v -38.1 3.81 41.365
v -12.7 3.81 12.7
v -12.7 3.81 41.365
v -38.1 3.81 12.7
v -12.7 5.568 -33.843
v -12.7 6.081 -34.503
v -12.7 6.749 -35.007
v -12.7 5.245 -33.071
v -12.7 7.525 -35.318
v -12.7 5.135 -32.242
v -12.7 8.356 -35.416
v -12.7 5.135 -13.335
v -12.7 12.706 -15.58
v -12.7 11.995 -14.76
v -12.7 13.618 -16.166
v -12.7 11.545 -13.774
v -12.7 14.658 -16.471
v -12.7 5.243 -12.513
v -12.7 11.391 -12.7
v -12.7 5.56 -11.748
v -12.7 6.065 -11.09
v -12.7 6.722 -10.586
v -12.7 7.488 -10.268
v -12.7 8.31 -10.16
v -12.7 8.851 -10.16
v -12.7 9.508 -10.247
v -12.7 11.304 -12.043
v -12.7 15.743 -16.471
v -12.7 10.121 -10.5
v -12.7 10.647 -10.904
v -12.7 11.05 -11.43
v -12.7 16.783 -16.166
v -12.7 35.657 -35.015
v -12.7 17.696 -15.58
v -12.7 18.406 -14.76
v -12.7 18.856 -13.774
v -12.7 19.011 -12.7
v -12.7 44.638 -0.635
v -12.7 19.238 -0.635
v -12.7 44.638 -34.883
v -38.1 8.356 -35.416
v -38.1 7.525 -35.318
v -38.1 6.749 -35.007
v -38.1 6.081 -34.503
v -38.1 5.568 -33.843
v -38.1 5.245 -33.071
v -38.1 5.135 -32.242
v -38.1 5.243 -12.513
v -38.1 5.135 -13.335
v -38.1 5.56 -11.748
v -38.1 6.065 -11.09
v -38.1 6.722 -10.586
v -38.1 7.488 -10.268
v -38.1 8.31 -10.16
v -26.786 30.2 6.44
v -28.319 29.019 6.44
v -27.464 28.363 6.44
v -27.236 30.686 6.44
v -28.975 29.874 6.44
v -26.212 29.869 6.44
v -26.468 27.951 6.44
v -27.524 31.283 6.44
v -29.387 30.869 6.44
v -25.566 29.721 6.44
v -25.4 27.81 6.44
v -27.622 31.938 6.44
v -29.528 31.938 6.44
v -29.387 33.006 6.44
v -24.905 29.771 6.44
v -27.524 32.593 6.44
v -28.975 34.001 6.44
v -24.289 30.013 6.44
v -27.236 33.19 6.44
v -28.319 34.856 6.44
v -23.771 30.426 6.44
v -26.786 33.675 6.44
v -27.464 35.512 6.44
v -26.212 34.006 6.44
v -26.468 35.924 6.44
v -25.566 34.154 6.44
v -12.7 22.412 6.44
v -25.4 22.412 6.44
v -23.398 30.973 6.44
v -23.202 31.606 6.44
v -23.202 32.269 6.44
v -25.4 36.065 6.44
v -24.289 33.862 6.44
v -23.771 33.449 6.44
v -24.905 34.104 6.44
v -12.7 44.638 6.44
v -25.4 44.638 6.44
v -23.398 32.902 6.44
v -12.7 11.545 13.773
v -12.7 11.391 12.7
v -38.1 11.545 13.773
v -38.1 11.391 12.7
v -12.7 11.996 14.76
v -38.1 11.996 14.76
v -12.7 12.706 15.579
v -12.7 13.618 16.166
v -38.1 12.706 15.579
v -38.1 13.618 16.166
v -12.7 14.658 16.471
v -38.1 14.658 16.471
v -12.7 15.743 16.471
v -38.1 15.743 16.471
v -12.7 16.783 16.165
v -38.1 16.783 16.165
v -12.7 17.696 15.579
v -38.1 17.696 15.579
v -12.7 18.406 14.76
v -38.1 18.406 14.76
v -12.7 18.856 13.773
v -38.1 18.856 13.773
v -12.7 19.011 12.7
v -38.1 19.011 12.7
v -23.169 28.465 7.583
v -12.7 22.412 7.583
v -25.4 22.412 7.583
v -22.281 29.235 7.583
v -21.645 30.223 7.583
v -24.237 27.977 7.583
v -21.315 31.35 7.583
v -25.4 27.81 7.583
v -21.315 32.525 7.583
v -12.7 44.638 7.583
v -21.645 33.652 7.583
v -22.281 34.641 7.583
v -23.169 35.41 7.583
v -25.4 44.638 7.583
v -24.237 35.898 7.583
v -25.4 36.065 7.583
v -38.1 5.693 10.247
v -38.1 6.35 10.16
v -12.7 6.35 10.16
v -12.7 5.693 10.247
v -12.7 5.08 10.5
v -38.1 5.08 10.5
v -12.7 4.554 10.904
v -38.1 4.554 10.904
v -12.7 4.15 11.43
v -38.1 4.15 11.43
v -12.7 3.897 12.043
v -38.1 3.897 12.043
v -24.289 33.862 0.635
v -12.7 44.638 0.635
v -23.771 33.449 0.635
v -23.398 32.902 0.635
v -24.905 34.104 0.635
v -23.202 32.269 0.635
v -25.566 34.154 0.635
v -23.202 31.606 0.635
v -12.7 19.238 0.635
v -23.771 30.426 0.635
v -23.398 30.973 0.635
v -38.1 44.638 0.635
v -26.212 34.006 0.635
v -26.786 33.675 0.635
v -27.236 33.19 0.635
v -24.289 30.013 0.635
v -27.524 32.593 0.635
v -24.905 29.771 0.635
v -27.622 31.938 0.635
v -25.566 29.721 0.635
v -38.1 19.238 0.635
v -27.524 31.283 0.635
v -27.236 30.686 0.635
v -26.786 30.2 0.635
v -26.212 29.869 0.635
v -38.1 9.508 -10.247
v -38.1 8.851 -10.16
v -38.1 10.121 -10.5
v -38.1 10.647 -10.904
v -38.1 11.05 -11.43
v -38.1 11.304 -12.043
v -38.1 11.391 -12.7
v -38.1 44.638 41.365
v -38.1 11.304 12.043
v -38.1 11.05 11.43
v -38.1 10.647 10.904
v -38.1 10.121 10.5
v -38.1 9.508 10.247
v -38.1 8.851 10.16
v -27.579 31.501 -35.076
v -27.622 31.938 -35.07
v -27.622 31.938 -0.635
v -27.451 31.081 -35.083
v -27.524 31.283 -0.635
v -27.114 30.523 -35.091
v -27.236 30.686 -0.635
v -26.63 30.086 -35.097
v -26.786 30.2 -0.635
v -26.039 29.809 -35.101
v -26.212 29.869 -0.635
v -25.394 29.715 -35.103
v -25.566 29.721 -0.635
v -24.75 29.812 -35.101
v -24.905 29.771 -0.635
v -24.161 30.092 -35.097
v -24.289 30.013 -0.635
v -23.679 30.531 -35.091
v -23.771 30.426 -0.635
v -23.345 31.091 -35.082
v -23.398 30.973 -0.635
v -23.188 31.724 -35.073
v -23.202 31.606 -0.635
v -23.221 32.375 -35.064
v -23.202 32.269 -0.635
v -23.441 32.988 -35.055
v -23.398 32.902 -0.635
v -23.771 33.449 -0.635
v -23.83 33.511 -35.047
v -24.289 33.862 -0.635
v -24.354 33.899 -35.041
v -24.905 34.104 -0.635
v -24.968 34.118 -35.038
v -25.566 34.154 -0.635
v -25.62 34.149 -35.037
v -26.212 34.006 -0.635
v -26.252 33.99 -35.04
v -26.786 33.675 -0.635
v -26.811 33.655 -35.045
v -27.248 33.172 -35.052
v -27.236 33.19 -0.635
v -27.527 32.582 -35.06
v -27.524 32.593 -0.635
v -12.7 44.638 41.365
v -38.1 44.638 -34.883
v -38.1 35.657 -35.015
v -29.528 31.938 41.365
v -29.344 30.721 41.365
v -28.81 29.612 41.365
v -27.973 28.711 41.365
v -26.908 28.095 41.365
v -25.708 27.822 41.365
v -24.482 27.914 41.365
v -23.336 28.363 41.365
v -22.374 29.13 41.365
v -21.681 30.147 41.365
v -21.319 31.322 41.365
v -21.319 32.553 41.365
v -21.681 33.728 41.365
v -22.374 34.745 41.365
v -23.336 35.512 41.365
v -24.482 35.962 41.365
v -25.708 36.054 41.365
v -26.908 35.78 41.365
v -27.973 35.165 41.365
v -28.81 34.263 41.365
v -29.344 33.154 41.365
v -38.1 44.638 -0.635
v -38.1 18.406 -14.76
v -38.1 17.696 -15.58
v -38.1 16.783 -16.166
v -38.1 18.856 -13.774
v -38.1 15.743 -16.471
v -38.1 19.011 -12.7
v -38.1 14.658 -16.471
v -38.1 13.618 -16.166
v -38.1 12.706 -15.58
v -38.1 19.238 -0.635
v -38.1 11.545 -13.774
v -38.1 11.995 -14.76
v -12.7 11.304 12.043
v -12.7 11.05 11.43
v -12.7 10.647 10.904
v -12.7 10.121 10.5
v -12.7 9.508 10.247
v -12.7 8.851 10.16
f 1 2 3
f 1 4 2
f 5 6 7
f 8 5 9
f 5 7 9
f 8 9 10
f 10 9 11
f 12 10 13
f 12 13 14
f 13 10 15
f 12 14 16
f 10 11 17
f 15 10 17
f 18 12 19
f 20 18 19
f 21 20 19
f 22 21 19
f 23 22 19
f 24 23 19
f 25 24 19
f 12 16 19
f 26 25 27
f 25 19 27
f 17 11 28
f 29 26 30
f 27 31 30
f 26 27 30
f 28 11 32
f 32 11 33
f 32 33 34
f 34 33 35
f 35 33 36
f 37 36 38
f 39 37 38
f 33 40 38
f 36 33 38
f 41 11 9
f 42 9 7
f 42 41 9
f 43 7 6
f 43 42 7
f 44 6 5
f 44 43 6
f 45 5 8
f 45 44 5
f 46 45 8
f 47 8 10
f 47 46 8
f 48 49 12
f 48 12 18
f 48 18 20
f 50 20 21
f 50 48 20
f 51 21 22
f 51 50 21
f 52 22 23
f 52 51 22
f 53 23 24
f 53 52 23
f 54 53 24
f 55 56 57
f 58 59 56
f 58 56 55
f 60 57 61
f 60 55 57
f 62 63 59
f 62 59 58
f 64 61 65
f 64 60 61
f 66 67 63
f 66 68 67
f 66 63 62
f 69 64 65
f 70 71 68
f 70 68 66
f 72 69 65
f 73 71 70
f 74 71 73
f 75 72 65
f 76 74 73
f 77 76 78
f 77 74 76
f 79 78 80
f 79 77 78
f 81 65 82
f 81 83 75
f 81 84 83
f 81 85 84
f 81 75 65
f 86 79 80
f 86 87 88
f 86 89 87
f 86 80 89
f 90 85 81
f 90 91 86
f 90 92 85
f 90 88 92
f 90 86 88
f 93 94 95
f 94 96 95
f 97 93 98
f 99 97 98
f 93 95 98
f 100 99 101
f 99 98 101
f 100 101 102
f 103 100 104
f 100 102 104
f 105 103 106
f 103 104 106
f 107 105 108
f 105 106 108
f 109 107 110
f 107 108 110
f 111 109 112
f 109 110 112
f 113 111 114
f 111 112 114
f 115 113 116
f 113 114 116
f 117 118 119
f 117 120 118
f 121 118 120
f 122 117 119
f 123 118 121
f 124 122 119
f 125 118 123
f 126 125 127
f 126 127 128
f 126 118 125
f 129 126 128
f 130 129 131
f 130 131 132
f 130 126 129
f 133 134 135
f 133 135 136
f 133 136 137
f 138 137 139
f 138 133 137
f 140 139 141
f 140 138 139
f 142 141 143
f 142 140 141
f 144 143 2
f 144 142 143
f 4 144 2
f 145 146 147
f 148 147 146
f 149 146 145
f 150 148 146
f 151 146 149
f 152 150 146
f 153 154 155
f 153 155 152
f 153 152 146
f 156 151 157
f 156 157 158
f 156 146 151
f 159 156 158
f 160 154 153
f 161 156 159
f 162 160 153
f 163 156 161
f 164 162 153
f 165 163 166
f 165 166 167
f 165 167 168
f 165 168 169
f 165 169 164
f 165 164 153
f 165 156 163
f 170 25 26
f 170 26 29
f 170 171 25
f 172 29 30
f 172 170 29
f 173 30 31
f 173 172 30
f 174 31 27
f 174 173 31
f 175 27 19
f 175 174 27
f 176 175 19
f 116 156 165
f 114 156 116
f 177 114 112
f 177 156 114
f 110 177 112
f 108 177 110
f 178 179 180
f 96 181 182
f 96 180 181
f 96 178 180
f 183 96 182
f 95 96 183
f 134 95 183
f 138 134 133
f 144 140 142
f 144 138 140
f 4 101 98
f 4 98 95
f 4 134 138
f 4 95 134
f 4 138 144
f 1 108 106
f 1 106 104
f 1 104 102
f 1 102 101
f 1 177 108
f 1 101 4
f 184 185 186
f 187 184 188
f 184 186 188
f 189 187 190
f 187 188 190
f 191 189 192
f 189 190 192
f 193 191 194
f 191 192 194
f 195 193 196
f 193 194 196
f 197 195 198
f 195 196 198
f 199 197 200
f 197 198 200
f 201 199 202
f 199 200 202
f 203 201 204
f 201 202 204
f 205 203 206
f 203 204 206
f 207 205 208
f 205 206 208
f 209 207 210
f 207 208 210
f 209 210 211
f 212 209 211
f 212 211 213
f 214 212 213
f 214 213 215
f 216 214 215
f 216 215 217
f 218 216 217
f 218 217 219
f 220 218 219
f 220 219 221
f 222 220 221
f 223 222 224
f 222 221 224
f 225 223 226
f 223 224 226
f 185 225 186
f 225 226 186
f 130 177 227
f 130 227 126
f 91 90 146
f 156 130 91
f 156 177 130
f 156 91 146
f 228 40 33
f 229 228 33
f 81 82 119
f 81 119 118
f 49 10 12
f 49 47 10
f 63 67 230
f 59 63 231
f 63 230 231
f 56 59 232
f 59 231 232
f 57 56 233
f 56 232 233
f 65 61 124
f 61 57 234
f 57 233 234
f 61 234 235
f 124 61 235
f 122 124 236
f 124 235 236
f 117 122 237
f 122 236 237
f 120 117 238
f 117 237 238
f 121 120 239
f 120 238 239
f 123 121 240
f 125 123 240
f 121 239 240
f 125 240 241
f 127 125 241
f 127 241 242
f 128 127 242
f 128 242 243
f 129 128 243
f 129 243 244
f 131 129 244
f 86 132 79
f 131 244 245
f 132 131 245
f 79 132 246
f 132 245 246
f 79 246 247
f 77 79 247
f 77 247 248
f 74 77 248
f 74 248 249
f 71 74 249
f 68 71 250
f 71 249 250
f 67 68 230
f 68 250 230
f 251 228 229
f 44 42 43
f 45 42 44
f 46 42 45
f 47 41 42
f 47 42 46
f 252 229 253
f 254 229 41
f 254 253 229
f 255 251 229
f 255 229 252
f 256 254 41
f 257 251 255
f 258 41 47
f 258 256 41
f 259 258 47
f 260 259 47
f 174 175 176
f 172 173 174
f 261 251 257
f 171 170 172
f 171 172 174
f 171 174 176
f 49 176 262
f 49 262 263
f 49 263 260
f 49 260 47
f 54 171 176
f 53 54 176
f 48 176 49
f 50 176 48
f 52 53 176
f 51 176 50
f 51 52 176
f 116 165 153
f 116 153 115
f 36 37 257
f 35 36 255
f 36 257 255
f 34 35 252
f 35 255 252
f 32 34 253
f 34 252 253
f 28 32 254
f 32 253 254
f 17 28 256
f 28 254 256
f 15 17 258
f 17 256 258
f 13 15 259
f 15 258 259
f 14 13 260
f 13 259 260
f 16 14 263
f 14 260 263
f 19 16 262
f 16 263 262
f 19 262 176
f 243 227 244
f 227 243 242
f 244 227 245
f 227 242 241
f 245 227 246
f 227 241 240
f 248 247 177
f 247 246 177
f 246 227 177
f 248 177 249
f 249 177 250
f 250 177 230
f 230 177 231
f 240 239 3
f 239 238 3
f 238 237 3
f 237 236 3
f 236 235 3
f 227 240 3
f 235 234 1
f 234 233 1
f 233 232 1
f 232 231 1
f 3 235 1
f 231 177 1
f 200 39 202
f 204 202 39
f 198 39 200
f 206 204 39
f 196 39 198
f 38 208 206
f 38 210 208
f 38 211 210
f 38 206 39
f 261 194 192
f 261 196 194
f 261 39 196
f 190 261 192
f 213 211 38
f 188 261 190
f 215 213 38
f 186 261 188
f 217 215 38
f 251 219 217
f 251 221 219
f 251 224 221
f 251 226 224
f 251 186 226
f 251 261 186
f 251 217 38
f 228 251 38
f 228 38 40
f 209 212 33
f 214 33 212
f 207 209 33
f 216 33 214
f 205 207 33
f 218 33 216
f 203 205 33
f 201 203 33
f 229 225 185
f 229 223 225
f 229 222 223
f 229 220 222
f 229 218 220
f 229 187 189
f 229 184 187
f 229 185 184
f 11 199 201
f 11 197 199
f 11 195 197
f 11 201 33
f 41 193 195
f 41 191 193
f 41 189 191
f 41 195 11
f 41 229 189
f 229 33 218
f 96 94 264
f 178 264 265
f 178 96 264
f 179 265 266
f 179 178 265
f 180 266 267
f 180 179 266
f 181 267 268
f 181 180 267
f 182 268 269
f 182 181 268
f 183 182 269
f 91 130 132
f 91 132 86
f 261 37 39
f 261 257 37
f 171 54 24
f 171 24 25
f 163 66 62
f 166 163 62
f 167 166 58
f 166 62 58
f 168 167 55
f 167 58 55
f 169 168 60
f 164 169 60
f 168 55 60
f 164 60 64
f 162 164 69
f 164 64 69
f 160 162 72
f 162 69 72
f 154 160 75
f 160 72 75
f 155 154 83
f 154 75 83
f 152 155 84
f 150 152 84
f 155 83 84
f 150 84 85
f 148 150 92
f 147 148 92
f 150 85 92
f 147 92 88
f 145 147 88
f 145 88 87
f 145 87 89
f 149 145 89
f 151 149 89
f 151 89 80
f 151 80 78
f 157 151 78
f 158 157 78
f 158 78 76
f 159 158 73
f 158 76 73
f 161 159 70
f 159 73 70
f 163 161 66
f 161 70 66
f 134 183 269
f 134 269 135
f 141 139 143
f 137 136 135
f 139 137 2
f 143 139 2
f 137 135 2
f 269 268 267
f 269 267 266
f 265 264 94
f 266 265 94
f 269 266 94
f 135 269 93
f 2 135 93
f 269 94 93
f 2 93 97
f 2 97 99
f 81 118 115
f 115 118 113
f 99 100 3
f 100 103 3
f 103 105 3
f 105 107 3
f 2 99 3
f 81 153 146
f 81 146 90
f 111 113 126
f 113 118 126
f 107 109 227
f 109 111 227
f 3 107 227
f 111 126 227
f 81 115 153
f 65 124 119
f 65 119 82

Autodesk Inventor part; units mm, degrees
sketch "Sketch1" plane through (0, 0, 0) normal (1, 0, 0) x (0, 1, 0)
  line L0 (-3.175, -15.8752) -> (-3.175, 15.8752)
  arc A0 (18.3756, 12.6998) -> (12.0256, 12.7) centre (15.2006, 12.6998) ccw
  arc A1 (12.0256, -12.7002) -> (18.3756, -12.7002) centre (15.2006, -12.7002) ccw
  line L1 (8.8506, 9.5252) -> (6.35, 9.5252)
  line L2 (8.8506, -9.5252) -> (5.1346, -9.5252)
  line L3 (15.2006, 12.6998) -> (15.2006, -12.7002) construction
  line L4 (3.175, 14.6052) -> (3.175, 12.7002)
  arc A2 (8.8506, 9.5252) -> (12.0256, 12.7) centre (8.8506, 12.7002) ccw
  arc A3 (12.0256, -12.7002) -> (8.8506, -9.5252) centre (8.8506, -12.7002) ccw
  arc A4 (3.175, 12.7002) -> (6.35, 9.5252) centre (6.35, 12.7002) ccw
  arc A5 (5.1346, -9.5252) -> (1.9937, -12.2364) centre (5.1346, -12.7002) ccw
  line L5 (-3.175, -15.8752) -> (-3.175, -22.2252)
  line L6 (1.905, 15.8752) -> (-3.175, 15.8752)
  arc A6 (3.175, 14.6052) -> (1.905, 15.8752) centre (1.905, 14.6052) ccw
  line L7 (18.3756, 12.6998) -> (18.3756, -12.7002)
  line L8 (1.6475, -13.2791) -> (-3.175, -22.2252)
  arc A7 (1.6475, -13.2791) -> (1.9937, -12.2364) centre (-1.1473, -11.7726) ccw
  line L9 (44.6375, 0.635) -> (19.2375, 0.635)
  line L10 (19.2375, 0.635) -> (19.2375, -0.635) construction
  line L11 (19.2375, -0.635) -> (44.6375, -0.635)
  line L12 (44.6375, -0.635) -> (44.6375, 0.635) construction
  line L13 (44.6375, 0.635) -> (19.2375, -0.635) construction
  line L14 (19.2375, 0.635) -> (44.6375, -0.635) construction
  line L15 (-13.1873, 0) -> (54.275, 0) projected
  line L16 (44.6375, -0.635) -> (44.6375, -26.035)
  line L17 (35.6573, -35.0153) -> (8.3561, -35.4163)
  line L18 (5.1346, -32.2418) -> (5.1346, -13.3352)
  line L19 (44.6375, 0.635) -> (44.6375, 32.385)
  line L20 (35.6573, 41.3653) -> (3.81, 41.3653)
  arc A8 (5.1346, -32.2418) -> (8.3561, -35.4163) centre (8.3094, -32.2418) ccw
  arc A9 (8.8506, 10.1602) -> (11.3906, 12.7) centre (8.8506, 12.7002) ccw
  line L21 (8.8506, 10.1602) -> (6.35, 10.1602)
  arc A10 (3.81, 12.7002) -> (6.35, 10.1602) centre (6.35, 12.7002) ccw
  line L22 (3.81, 12.7002) -> (3.81, 41.3653)
  line L23 (8.3096, -10.1602) -> (8.8506, -10.1602)
  arc A11 (11.3906, -12.7002) -> (8.8506, -10.1602) centre (8.8506, -12.7002) ccw
  arc A12 (11.3906, -12.7002) -> (19.0106, -12.7002) centre (15.2006, -12.7002) ccw
  arc A13 (19.0106, 12.6998) -> (11.3906, 12.7) centre (15.2006, 12.6998) ccw
  line L24 (-3.5499, 0) -> (-3.5499, -1.7744)
  line L25 (19.0106, -12.7002) -> (19.2375, -0.635)
  line L26 (19.2375, 0.635) -> (19.0106, 12.6998)
  arc A14 (8.3096, -10.1602) -> (5.1346, -13.3352) centre (8.3096, -13.3352) ccw
  line L27 (-3.175, -22.2252) -> (1.6475, -22.2252)
  line L28 (35.6573, 41.3653) -> (44.6375, 41.3653)
  line L29 (44.6375, 41.3653) -> (44.6375, 32.385)
  line L30 (44.6375, -26.035) -> (44.6375, -34.8834)
  line L31 (44.6375, -34.8834) -> (35.6573, -35.0153)
  point P0 (0, 0)
  point P1 (15.2516, 9.5252)
  point P2 (15.2006, -9.5252)
  point P3 (1.9596, -12.7002)
  point P4 (31.9375, 0)
  point P5 (31.9375, 0)
  dimension "d5" = 6.35
  dimension "d8" = 3.175
  dimension "d9" = 6.35
  dimension "d11" = 6.35
  dimension "d12" = 6.35
  dimension "d13" = 1.27
  dimension "d30" = 25.4
  dimension "d31" = 3.175
  dimension "d51" = 1.27
  dimension "d54" = 25.4
  dimension "d56" = 25.4
  dimension "d59" = 31.75
  dimension "d60" = 0.635
  dimension "d61" = 3.175
extrude "Extrusion8" add sketch "Sketch1" along normal mid plane 25.4 contours L9 L26 A13 A9 L21 A10 L22 L20 L28 L29 L19 | L11 L16 L30 L31 L17 A8 L18 A14 L23 A11 A12 L25
ref_plane "Work Plane12" through (-12.7, 35.6573, 41.3653) normal (0, 0, 1) x (1, 0, 0)
sketch "Sketch9" plane through (-12.7, 35.6573, 41.3653) normal (0, 0, 1) x (1, 0, 0)
  line L0 (0, -16.4197) -> (25.4, -16.4197) projected
  line L1 (25.4, 8.9803) -> (25.4, -16.4197) projected
  line L2 (25.4, 8.9803) -> (0, 8.9803) projected
  line L3 (0, -16.4197) -> (0, 8.9803) projected
  circle A0 centre (12.7, -3.7197) radius 2.2225
  point P0 (12.7, -35.6573)
  dimension "d68" = 4.445
extrude "Extrusion10" cut sketch "Sketch9" against normal through all contours A0
ref_plane "Work Plane13" through (-12.7, 35.6573, 41.3653) normal (0, 0, 1) x (1, 0, 0)
sketch "Sketch10" plane through (-12.7, 35.6573, 41.3653) normal (0, 0, 1) x (1, 0, 0)
  circle A0 centre (12.7, -3.7197) radius 2.2225 projected
  circle A1 centre (12.7, -3.7197) radius 4.1275
  point P0 (12.7, -35.6573)
  dimension "d71" = 8.255
extrude "Extrusion11" cut sketch "Sketch10" against normal blind 34.925
sketch "Sketch11" plane through (12.7, 35.6573, -35.0153) normal (0, 0.0147, -0.9999) x (-1, 0, 0)
  ellipse E0 centre (12.7, -3.7201) end of major axis (12.7, -1.4974) minor radius 2.2225 projected
  circle A0 centre (12.7, -3.7201) radius 6.35
  point P0 (12.7, -35.1392)
  dimension "d74" = 12.7
extrude "Extrusion12" cut sketch "Sketch11" against normal blind 28.575 contours E0 | A0
sketch "Sketch12" plane through (-12.7, 44.6375, 41.3653) normal (0, 1, 0) x (1, 0, 0)
  line L0 (0, 28.6651) -> (0, 0) projected
  line L1 (12.7, 33.782) -> (0, 33.782)
  line L2 (0, 33.782) -> (0, 34.925)
  line L3 (0, 34.925) -> (12.7, 34.925)
  line L4 (12.7, 34.925) -> (12.7, 33.782)
  line L5 (25.4, 0) -> (0, 0) projected
  line L6 (25.4, 40.7303) -> (25.4, 0) projected
  point P0 (12.7, 41.3653)
  dimension "d87" = 12.7
  dimension "d88" = 1.143
  dimension "d89" = 34.925
extrude "Extrusion15" cut sketch "Sketch12" against normal blind 22.225
mirror "Mirror2" about plane through (-12.7, 26.1957, -18.7652) normal (-1, 0, 0) of "Extrusion8", "Extrusion10", "Extrusion11", "Extrusion15"
ref_plane "Work Plane14" through (-12.7, 3.81, 41.3653) normal (-1, 0, 0) x (0, 0, 1)
sketch "Sketch13" plane through (-12.7, 3.81, 41.3653) normal (-1, 0, 0) x (0, 0, 1)
  line L0 (-94.6271, -9.8298) -> (11.8966, -9.8298)
  line L1 (11.8966, -9.8298) -> (11.8966, 53.0983)
  line L2 (11.8966, 53.0983) -> (-94.6271, 53.0983)
  line L3 (-94.6271, 53.0983) -> (-94.6271, -9.8298)
  line L4 (-94.6271, -9.8298) -> (11.8966, 53.0983) construction
  line L5 (11.8966, -9.8298) -> (-94.6271, 53.0983) construction
  point P0 (-41.3653, -3.81)
  point P1 (-41.3653, 21.6342)
extrude "Extrusion16" cut sketch "Sketch13" against normal through all
properties part number "Cup Holder Bracket" material "Acetal Resin, Black"
